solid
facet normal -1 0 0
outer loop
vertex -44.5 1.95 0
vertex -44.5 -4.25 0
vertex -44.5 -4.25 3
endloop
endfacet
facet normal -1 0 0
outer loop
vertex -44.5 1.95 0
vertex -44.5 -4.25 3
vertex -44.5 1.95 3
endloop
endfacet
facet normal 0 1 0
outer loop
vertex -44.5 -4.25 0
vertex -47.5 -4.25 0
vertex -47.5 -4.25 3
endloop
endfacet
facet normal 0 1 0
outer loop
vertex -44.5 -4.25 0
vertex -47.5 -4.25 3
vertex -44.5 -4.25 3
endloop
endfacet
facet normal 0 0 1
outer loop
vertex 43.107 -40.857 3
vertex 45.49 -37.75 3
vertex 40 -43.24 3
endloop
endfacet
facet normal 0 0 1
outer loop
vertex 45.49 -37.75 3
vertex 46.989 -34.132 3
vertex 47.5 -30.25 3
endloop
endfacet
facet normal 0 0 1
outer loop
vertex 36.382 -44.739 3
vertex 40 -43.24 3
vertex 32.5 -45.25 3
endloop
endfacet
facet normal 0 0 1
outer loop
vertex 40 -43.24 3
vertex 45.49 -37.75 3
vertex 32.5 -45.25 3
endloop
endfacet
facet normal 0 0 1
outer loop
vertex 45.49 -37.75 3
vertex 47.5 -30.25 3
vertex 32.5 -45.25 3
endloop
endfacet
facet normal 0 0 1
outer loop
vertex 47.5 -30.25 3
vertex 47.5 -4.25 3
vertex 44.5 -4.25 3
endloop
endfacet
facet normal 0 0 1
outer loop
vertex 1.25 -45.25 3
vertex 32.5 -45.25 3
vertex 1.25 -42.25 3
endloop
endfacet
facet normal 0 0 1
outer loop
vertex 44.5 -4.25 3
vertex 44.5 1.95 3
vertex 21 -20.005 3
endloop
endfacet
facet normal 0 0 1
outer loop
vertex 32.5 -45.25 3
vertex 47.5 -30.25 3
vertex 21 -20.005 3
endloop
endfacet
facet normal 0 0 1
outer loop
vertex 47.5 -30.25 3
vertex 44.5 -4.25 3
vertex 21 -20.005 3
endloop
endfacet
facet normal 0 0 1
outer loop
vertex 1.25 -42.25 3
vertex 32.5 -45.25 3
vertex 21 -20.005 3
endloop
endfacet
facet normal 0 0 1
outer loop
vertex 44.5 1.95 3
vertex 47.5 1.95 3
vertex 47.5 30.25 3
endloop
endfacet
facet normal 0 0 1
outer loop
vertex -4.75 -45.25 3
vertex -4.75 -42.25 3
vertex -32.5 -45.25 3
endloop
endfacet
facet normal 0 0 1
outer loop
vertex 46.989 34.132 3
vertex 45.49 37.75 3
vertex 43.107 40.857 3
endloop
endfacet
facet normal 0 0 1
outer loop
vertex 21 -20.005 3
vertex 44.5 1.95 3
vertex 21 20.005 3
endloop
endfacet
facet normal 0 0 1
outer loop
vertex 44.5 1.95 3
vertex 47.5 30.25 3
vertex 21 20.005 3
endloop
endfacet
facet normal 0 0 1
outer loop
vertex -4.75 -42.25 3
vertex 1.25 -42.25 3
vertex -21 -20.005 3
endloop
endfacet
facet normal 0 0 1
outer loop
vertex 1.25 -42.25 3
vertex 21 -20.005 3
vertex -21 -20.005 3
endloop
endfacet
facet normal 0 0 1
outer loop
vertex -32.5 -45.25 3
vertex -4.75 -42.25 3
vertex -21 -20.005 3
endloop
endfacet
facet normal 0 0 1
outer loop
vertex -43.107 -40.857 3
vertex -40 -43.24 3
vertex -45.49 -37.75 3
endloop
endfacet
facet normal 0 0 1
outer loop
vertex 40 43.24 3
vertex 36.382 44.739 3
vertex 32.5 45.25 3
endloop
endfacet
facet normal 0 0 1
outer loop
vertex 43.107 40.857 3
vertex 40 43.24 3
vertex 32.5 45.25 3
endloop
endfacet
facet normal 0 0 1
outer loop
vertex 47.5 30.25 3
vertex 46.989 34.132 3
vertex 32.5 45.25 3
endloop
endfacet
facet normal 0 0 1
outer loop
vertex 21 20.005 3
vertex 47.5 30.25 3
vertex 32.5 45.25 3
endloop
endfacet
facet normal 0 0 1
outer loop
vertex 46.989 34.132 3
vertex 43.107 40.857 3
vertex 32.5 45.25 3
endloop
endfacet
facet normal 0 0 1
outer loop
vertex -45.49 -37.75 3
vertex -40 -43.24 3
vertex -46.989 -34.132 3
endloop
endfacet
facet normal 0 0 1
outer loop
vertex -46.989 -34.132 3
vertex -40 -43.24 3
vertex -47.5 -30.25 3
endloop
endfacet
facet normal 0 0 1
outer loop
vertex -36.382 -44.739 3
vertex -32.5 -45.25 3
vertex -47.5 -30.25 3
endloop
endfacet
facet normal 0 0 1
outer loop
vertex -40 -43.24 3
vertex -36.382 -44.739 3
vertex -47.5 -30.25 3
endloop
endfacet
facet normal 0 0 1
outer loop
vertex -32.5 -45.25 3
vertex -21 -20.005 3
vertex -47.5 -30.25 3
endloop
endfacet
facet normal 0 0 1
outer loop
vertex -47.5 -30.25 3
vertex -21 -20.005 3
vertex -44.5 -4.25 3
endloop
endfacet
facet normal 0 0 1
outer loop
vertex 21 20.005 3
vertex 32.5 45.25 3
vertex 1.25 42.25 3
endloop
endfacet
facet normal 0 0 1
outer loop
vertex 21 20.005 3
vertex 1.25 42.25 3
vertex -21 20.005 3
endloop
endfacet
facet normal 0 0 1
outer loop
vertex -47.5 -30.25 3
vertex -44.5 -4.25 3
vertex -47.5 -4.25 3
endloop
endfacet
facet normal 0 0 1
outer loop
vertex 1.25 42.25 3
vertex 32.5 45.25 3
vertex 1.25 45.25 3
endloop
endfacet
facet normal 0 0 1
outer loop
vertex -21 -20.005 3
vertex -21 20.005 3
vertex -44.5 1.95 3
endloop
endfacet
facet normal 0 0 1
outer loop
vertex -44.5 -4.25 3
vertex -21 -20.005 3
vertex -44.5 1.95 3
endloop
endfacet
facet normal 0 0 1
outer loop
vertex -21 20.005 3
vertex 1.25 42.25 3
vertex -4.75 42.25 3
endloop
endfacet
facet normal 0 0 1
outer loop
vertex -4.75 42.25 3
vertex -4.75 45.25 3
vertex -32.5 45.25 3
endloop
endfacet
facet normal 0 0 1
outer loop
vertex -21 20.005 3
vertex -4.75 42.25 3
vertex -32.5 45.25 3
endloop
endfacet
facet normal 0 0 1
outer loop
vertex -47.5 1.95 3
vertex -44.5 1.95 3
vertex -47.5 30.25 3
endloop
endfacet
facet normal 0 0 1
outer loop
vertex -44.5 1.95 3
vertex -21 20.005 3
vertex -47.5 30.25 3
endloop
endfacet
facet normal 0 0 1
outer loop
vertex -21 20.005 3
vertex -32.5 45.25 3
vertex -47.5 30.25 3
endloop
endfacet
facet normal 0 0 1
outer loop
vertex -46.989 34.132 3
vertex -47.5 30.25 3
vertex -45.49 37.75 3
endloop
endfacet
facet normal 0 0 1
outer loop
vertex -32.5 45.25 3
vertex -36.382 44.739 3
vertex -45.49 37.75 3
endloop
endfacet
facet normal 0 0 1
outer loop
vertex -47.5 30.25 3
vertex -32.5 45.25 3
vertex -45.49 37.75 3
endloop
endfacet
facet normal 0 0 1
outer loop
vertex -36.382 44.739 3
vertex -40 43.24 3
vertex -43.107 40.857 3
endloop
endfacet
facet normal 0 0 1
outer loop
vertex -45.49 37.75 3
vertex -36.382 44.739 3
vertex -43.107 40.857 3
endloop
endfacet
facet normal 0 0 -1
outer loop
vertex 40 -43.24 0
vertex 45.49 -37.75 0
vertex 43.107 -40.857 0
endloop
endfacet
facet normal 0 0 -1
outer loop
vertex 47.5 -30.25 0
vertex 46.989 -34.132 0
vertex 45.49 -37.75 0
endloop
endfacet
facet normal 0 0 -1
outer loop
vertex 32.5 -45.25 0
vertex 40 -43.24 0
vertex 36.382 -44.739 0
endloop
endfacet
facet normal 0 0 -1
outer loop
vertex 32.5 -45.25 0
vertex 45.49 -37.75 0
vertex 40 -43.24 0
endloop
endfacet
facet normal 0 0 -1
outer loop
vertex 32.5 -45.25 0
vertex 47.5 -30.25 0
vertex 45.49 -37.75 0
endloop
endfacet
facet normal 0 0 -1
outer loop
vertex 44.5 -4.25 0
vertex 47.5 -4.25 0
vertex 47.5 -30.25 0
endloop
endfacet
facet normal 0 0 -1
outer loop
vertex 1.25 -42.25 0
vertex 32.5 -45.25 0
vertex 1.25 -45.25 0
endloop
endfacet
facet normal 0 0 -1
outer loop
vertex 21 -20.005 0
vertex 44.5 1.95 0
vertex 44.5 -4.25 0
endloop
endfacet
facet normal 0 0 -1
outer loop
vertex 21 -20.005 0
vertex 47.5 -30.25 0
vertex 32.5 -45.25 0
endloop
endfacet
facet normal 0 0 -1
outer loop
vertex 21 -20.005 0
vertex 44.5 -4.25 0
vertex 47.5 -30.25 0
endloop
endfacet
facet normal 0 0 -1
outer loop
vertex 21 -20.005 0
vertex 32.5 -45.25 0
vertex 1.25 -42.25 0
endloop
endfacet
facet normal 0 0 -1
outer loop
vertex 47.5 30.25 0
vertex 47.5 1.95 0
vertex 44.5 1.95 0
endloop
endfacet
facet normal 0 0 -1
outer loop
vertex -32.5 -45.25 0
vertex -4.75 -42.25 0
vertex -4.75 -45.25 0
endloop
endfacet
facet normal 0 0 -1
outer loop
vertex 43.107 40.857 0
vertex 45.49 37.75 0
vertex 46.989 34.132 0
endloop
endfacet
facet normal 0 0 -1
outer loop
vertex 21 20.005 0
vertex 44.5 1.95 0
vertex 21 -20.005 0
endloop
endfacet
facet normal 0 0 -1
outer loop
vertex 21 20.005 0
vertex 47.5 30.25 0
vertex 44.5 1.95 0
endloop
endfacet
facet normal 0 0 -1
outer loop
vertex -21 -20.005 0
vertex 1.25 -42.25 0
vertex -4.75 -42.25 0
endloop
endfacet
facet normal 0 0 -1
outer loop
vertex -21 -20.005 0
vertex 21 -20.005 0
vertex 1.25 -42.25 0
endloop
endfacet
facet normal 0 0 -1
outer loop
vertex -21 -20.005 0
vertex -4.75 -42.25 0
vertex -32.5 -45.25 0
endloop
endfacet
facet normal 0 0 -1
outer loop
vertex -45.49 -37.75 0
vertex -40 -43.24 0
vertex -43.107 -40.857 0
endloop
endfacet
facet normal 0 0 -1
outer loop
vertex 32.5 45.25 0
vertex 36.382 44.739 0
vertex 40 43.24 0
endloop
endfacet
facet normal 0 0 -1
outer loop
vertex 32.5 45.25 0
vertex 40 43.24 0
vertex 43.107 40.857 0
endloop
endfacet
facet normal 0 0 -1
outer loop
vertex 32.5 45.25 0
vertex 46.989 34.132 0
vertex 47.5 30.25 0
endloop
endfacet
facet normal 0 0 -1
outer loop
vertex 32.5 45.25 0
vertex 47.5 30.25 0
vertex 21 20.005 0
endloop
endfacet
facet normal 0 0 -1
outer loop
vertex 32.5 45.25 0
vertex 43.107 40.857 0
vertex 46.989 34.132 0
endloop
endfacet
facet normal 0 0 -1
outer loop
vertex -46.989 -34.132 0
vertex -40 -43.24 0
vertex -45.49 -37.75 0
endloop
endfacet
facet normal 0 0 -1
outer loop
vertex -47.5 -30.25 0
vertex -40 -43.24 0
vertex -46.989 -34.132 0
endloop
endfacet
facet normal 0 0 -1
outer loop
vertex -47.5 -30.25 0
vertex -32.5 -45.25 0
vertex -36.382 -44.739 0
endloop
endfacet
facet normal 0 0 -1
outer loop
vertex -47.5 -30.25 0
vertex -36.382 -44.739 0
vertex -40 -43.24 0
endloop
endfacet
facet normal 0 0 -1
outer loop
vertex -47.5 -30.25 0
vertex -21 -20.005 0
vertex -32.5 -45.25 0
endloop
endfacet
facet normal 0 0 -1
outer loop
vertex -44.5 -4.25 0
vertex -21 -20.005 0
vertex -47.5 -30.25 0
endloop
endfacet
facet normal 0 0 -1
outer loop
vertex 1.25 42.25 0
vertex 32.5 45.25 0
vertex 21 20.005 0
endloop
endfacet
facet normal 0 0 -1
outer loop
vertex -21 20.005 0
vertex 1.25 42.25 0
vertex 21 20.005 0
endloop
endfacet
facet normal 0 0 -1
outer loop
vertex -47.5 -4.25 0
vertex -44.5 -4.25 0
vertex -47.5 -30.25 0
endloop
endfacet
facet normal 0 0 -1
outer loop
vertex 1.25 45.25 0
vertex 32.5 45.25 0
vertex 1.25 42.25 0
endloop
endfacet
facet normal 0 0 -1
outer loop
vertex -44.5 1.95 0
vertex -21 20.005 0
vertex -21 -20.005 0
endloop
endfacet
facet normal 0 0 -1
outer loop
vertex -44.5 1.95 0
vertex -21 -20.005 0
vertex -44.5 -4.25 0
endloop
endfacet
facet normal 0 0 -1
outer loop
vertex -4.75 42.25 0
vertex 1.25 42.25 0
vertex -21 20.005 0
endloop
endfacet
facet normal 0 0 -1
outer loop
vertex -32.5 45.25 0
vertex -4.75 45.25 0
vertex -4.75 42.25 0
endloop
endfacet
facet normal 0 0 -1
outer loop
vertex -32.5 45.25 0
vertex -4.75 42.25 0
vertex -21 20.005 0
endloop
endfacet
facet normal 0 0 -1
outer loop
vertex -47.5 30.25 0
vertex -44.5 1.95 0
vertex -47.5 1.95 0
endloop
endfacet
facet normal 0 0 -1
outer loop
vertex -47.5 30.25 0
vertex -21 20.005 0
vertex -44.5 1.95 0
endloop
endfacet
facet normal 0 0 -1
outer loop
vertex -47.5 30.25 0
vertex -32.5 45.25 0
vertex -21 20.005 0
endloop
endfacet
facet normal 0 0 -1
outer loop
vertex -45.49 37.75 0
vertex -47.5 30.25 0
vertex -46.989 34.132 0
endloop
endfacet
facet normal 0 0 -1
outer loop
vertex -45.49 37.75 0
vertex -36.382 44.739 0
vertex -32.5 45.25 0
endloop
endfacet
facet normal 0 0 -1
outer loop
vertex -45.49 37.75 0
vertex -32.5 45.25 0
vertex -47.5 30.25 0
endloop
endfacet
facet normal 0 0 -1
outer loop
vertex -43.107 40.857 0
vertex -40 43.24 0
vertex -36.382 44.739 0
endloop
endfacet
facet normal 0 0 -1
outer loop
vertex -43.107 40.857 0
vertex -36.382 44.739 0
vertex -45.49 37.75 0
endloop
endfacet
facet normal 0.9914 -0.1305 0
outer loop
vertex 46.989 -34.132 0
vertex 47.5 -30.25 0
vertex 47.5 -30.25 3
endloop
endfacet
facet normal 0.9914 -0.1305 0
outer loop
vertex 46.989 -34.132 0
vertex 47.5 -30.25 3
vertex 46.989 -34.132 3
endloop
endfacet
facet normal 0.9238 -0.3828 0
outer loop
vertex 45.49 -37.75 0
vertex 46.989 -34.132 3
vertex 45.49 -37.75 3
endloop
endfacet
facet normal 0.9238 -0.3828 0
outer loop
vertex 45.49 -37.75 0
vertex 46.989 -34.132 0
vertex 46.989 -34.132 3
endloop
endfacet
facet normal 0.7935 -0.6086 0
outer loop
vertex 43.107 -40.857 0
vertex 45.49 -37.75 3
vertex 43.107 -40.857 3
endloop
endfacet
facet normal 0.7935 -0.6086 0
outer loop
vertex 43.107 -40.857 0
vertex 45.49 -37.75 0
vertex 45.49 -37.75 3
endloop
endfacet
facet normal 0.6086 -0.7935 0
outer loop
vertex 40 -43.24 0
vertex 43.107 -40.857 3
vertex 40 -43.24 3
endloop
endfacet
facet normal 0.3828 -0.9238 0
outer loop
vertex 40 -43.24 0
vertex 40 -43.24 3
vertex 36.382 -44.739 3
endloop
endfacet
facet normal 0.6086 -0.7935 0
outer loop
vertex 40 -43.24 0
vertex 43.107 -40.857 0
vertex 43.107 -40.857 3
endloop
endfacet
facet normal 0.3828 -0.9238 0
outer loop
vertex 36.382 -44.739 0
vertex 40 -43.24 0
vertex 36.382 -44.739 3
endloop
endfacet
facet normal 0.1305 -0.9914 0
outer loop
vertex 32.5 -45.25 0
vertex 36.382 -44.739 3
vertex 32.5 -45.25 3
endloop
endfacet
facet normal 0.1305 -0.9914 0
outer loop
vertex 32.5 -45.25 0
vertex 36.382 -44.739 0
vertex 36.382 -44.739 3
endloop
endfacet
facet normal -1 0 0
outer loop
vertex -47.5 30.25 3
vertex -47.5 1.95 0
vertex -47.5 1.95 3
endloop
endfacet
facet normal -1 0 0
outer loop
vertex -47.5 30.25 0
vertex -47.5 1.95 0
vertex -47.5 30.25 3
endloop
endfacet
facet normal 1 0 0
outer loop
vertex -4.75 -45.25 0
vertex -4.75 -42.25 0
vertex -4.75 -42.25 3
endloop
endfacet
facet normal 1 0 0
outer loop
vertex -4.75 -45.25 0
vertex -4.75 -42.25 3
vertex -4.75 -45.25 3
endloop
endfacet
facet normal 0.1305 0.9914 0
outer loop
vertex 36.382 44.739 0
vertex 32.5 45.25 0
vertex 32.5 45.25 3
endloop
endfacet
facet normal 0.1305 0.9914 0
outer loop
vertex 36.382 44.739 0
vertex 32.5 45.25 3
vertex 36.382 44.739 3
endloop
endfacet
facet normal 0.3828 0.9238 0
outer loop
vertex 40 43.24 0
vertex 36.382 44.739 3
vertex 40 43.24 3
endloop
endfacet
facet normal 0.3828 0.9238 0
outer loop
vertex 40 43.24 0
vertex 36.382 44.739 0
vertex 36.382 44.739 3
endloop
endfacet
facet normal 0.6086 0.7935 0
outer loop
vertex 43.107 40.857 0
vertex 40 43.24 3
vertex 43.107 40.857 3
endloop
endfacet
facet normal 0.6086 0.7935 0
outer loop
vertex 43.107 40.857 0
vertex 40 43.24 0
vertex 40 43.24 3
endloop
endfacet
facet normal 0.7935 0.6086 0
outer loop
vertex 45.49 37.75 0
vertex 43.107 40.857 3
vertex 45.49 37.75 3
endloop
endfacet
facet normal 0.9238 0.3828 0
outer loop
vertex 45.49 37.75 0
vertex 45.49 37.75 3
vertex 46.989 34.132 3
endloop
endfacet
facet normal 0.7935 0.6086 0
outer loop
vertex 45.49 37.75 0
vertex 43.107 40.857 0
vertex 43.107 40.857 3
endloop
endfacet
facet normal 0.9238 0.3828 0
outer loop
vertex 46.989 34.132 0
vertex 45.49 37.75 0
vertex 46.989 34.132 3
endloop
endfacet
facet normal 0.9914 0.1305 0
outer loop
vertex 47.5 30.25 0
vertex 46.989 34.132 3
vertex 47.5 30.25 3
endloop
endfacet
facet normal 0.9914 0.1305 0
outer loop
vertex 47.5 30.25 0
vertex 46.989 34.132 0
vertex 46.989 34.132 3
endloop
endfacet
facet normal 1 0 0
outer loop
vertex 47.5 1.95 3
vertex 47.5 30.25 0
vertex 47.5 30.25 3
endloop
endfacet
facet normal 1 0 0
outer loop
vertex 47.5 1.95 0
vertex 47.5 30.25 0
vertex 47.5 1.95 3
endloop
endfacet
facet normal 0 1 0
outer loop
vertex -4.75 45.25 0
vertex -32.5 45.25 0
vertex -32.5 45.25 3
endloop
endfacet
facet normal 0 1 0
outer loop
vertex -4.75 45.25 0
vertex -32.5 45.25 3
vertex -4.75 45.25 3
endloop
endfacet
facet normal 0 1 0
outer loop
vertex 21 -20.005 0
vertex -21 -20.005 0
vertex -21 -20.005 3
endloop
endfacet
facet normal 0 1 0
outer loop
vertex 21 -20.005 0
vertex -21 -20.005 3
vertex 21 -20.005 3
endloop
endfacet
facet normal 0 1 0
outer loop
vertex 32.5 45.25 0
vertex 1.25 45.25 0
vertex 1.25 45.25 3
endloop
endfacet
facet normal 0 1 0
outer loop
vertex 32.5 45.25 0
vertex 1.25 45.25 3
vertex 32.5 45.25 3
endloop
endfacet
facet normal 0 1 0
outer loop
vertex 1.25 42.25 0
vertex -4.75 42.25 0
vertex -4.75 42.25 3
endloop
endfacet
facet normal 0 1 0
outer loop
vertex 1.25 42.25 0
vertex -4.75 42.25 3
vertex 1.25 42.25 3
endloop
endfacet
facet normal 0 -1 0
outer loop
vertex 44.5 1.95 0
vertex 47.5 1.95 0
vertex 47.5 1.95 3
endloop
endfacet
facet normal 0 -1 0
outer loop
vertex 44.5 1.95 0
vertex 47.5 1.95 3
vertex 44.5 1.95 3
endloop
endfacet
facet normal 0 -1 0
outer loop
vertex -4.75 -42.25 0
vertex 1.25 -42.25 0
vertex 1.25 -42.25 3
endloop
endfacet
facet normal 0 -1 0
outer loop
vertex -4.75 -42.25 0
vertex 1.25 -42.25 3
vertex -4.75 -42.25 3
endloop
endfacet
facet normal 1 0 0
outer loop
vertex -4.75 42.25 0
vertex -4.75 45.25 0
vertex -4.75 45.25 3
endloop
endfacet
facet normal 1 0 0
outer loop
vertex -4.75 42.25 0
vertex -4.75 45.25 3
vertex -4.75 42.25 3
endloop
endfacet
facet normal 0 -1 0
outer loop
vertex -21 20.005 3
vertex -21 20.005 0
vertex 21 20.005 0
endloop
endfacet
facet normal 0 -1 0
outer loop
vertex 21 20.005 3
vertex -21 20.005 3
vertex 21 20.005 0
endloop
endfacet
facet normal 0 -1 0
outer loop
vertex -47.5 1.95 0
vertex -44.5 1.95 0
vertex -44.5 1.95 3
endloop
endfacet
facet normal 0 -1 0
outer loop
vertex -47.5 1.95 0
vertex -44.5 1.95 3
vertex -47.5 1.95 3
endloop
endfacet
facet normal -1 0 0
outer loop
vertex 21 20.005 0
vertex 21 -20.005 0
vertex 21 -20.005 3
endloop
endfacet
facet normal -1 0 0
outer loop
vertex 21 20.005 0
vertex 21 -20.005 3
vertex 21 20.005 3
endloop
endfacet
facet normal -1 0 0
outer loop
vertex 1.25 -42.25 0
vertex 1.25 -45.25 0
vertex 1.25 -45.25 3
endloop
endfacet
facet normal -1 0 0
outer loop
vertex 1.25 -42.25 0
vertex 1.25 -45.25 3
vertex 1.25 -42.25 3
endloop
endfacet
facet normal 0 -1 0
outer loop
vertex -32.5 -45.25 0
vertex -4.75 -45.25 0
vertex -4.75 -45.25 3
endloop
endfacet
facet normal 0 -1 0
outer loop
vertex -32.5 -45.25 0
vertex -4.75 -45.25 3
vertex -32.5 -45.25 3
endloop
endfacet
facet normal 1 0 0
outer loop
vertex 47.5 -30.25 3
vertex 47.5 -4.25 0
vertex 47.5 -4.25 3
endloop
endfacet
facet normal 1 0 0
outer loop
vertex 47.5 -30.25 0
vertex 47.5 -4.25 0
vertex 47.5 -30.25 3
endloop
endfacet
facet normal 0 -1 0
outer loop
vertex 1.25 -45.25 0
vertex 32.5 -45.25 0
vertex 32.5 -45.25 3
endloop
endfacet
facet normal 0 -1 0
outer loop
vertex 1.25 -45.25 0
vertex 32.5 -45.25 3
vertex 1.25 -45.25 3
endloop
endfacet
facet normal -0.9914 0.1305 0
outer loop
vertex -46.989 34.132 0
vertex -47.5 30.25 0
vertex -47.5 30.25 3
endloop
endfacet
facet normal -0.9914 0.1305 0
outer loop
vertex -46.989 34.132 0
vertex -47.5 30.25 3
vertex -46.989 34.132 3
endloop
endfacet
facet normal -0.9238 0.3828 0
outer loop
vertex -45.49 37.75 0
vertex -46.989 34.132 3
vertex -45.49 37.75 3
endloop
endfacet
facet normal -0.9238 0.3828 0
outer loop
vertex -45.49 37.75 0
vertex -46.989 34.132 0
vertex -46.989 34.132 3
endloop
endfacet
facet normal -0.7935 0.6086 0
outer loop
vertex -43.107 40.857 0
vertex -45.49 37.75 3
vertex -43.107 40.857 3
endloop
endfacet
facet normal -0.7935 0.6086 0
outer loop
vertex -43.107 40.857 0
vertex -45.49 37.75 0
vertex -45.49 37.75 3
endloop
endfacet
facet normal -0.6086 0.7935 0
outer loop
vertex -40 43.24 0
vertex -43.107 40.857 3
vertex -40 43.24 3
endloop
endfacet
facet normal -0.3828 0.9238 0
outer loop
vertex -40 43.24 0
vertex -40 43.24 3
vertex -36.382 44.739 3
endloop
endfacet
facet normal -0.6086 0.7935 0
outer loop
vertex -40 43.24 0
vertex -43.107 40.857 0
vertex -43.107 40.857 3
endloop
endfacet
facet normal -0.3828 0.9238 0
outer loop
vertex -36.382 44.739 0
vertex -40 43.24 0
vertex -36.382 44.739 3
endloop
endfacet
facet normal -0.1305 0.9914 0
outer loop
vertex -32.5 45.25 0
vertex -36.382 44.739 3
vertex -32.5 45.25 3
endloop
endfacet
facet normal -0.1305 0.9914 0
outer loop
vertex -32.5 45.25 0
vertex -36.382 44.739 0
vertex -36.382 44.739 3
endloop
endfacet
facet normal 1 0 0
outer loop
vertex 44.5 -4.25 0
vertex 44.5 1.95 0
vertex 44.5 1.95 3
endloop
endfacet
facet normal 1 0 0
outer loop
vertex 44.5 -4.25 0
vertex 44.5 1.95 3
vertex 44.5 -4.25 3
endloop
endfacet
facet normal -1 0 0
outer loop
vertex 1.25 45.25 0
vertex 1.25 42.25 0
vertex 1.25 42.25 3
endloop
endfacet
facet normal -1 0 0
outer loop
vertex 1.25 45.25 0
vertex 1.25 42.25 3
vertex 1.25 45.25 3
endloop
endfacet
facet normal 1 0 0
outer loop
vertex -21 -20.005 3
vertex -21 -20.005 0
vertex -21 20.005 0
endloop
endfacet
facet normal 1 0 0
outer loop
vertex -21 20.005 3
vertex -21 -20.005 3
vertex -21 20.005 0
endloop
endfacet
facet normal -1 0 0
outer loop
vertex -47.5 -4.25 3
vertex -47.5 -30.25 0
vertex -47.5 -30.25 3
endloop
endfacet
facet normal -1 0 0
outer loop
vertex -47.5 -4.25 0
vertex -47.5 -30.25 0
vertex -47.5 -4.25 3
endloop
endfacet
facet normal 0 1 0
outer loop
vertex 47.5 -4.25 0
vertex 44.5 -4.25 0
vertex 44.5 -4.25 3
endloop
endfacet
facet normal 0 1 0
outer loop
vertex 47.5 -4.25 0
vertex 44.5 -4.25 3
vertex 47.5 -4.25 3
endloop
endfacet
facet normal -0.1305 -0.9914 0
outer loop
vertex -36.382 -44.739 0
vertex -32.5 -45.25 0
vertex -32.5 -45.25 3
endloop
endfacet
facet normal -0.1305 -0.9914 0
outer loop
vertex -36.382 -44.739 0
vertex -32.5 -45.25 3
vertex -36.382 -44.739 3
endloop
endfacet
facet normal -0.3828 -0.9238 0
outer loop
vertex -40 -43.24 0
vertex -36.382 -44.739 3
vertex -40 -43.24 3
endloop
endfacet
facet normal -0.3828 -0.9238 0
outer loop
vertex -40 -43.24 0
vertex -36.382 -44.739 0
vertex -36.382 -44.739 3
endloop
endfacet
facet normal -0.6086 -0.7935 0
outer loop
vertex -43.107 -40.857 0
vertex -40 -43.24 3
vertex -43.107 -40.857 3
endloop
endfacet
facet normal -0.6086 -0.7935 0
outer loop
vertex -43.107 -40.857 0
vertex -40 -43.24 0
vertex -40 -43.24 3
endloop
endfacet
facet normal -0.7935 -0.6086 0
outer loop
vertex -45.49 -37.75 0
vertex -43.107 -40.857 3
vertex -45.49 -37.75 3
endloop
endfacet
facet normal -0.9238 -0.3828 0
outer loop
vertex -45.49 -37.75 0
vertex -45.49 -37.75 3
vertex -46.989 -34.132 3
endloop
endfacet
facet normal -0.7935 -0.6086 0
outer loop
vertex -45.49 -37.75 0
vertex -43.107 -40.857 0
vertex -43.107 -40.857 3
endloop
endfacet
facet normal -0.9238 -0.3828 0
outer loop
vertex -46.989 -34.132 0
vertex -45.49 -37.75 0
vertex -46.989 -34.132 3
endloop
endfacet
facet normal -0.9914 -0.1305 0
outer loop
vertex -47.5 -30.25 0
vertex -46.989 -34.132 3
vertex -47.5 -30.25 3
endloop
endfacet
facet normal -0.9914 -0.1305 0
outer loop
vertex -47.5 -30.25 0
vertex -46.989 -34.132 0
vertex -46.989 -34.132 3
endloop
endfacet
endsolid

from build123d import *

# Parameters (mm, degrees)
SKETCH1_W           = 42
SKETCH1_H           = 40.010526316
BOSS_EXTRUDE1_DEPTH = 3


with BuildPart() as part:
    # Sketch1 → Boss-Extrude1 (new body)
    with BuildSketch(Plane.XY):
        with BuildLine():
            Line((-47.5, -4.25), (-44.5, -4.25))
            Line((-44.5, -4.25), (-44.5, 1.95))
            Line((-44.5, 1.95), (-47.5, 1.95))
            Line((-47.5, 1.95), (-47.5, 30.25))
            ThreePointArc((-47.5, 30.25), (-43.106601718, 40.856601718), (-32.5, 45.25))
            Line((-32.5, 45.25), (-4.75, 45.25))
            Line((-4.75, 45.25), (-4.75, 42.25))
            Line((-4.75, 42.25), (1.25, 42.25))
            Line((1.25, 42.25), (1.25, 45.25))
            Line((1.25, 45.25), (32.5, 45.25))
            ThreePointArc((32.5, 45.25), (43.106601718, 40.856601718), (47.5, 30.25))
            Line((47.5, 30.25), (47.5, 1.95))
            Line((47.5, 1.95), (44.5, 1.95))
            Line((44.5, 1.95), (44.5, -4.25))
            Line((44.5, -4.25), (47.5, -4.25))
            Line((47.5, -4.25), (47.5, -30.25))
            ThreePointArc((47.5, -30.25), (43.106601718, -40.856601718), (32.5, -45.25))
            Line((32.5, -45.25), (1.25, -45.25))
            Line((1.25, -45.25), (1.25, -42.25))
            Line((1.25, -42.25), (-4.75, -42.25))
            Line((-4.75, -42.25), (-4.75, -45.25))
            Line((-4.75, -45.25), (-32.5, -45.25))
            ThreePointArc((-32.5, -45.25), (-43.106601718, -40.856601718), (-47.5, -30.25))
            Line((-47.5, -30.25), (-47.5, -4.25))
        make_face()
        Rectangle(SKETCH1_W, SKETCH1_H, mode=Mode.SUBTRACT)
    extrude(amount=BOSS_EXTRUDE1_DEPTH)


solid = part.part
